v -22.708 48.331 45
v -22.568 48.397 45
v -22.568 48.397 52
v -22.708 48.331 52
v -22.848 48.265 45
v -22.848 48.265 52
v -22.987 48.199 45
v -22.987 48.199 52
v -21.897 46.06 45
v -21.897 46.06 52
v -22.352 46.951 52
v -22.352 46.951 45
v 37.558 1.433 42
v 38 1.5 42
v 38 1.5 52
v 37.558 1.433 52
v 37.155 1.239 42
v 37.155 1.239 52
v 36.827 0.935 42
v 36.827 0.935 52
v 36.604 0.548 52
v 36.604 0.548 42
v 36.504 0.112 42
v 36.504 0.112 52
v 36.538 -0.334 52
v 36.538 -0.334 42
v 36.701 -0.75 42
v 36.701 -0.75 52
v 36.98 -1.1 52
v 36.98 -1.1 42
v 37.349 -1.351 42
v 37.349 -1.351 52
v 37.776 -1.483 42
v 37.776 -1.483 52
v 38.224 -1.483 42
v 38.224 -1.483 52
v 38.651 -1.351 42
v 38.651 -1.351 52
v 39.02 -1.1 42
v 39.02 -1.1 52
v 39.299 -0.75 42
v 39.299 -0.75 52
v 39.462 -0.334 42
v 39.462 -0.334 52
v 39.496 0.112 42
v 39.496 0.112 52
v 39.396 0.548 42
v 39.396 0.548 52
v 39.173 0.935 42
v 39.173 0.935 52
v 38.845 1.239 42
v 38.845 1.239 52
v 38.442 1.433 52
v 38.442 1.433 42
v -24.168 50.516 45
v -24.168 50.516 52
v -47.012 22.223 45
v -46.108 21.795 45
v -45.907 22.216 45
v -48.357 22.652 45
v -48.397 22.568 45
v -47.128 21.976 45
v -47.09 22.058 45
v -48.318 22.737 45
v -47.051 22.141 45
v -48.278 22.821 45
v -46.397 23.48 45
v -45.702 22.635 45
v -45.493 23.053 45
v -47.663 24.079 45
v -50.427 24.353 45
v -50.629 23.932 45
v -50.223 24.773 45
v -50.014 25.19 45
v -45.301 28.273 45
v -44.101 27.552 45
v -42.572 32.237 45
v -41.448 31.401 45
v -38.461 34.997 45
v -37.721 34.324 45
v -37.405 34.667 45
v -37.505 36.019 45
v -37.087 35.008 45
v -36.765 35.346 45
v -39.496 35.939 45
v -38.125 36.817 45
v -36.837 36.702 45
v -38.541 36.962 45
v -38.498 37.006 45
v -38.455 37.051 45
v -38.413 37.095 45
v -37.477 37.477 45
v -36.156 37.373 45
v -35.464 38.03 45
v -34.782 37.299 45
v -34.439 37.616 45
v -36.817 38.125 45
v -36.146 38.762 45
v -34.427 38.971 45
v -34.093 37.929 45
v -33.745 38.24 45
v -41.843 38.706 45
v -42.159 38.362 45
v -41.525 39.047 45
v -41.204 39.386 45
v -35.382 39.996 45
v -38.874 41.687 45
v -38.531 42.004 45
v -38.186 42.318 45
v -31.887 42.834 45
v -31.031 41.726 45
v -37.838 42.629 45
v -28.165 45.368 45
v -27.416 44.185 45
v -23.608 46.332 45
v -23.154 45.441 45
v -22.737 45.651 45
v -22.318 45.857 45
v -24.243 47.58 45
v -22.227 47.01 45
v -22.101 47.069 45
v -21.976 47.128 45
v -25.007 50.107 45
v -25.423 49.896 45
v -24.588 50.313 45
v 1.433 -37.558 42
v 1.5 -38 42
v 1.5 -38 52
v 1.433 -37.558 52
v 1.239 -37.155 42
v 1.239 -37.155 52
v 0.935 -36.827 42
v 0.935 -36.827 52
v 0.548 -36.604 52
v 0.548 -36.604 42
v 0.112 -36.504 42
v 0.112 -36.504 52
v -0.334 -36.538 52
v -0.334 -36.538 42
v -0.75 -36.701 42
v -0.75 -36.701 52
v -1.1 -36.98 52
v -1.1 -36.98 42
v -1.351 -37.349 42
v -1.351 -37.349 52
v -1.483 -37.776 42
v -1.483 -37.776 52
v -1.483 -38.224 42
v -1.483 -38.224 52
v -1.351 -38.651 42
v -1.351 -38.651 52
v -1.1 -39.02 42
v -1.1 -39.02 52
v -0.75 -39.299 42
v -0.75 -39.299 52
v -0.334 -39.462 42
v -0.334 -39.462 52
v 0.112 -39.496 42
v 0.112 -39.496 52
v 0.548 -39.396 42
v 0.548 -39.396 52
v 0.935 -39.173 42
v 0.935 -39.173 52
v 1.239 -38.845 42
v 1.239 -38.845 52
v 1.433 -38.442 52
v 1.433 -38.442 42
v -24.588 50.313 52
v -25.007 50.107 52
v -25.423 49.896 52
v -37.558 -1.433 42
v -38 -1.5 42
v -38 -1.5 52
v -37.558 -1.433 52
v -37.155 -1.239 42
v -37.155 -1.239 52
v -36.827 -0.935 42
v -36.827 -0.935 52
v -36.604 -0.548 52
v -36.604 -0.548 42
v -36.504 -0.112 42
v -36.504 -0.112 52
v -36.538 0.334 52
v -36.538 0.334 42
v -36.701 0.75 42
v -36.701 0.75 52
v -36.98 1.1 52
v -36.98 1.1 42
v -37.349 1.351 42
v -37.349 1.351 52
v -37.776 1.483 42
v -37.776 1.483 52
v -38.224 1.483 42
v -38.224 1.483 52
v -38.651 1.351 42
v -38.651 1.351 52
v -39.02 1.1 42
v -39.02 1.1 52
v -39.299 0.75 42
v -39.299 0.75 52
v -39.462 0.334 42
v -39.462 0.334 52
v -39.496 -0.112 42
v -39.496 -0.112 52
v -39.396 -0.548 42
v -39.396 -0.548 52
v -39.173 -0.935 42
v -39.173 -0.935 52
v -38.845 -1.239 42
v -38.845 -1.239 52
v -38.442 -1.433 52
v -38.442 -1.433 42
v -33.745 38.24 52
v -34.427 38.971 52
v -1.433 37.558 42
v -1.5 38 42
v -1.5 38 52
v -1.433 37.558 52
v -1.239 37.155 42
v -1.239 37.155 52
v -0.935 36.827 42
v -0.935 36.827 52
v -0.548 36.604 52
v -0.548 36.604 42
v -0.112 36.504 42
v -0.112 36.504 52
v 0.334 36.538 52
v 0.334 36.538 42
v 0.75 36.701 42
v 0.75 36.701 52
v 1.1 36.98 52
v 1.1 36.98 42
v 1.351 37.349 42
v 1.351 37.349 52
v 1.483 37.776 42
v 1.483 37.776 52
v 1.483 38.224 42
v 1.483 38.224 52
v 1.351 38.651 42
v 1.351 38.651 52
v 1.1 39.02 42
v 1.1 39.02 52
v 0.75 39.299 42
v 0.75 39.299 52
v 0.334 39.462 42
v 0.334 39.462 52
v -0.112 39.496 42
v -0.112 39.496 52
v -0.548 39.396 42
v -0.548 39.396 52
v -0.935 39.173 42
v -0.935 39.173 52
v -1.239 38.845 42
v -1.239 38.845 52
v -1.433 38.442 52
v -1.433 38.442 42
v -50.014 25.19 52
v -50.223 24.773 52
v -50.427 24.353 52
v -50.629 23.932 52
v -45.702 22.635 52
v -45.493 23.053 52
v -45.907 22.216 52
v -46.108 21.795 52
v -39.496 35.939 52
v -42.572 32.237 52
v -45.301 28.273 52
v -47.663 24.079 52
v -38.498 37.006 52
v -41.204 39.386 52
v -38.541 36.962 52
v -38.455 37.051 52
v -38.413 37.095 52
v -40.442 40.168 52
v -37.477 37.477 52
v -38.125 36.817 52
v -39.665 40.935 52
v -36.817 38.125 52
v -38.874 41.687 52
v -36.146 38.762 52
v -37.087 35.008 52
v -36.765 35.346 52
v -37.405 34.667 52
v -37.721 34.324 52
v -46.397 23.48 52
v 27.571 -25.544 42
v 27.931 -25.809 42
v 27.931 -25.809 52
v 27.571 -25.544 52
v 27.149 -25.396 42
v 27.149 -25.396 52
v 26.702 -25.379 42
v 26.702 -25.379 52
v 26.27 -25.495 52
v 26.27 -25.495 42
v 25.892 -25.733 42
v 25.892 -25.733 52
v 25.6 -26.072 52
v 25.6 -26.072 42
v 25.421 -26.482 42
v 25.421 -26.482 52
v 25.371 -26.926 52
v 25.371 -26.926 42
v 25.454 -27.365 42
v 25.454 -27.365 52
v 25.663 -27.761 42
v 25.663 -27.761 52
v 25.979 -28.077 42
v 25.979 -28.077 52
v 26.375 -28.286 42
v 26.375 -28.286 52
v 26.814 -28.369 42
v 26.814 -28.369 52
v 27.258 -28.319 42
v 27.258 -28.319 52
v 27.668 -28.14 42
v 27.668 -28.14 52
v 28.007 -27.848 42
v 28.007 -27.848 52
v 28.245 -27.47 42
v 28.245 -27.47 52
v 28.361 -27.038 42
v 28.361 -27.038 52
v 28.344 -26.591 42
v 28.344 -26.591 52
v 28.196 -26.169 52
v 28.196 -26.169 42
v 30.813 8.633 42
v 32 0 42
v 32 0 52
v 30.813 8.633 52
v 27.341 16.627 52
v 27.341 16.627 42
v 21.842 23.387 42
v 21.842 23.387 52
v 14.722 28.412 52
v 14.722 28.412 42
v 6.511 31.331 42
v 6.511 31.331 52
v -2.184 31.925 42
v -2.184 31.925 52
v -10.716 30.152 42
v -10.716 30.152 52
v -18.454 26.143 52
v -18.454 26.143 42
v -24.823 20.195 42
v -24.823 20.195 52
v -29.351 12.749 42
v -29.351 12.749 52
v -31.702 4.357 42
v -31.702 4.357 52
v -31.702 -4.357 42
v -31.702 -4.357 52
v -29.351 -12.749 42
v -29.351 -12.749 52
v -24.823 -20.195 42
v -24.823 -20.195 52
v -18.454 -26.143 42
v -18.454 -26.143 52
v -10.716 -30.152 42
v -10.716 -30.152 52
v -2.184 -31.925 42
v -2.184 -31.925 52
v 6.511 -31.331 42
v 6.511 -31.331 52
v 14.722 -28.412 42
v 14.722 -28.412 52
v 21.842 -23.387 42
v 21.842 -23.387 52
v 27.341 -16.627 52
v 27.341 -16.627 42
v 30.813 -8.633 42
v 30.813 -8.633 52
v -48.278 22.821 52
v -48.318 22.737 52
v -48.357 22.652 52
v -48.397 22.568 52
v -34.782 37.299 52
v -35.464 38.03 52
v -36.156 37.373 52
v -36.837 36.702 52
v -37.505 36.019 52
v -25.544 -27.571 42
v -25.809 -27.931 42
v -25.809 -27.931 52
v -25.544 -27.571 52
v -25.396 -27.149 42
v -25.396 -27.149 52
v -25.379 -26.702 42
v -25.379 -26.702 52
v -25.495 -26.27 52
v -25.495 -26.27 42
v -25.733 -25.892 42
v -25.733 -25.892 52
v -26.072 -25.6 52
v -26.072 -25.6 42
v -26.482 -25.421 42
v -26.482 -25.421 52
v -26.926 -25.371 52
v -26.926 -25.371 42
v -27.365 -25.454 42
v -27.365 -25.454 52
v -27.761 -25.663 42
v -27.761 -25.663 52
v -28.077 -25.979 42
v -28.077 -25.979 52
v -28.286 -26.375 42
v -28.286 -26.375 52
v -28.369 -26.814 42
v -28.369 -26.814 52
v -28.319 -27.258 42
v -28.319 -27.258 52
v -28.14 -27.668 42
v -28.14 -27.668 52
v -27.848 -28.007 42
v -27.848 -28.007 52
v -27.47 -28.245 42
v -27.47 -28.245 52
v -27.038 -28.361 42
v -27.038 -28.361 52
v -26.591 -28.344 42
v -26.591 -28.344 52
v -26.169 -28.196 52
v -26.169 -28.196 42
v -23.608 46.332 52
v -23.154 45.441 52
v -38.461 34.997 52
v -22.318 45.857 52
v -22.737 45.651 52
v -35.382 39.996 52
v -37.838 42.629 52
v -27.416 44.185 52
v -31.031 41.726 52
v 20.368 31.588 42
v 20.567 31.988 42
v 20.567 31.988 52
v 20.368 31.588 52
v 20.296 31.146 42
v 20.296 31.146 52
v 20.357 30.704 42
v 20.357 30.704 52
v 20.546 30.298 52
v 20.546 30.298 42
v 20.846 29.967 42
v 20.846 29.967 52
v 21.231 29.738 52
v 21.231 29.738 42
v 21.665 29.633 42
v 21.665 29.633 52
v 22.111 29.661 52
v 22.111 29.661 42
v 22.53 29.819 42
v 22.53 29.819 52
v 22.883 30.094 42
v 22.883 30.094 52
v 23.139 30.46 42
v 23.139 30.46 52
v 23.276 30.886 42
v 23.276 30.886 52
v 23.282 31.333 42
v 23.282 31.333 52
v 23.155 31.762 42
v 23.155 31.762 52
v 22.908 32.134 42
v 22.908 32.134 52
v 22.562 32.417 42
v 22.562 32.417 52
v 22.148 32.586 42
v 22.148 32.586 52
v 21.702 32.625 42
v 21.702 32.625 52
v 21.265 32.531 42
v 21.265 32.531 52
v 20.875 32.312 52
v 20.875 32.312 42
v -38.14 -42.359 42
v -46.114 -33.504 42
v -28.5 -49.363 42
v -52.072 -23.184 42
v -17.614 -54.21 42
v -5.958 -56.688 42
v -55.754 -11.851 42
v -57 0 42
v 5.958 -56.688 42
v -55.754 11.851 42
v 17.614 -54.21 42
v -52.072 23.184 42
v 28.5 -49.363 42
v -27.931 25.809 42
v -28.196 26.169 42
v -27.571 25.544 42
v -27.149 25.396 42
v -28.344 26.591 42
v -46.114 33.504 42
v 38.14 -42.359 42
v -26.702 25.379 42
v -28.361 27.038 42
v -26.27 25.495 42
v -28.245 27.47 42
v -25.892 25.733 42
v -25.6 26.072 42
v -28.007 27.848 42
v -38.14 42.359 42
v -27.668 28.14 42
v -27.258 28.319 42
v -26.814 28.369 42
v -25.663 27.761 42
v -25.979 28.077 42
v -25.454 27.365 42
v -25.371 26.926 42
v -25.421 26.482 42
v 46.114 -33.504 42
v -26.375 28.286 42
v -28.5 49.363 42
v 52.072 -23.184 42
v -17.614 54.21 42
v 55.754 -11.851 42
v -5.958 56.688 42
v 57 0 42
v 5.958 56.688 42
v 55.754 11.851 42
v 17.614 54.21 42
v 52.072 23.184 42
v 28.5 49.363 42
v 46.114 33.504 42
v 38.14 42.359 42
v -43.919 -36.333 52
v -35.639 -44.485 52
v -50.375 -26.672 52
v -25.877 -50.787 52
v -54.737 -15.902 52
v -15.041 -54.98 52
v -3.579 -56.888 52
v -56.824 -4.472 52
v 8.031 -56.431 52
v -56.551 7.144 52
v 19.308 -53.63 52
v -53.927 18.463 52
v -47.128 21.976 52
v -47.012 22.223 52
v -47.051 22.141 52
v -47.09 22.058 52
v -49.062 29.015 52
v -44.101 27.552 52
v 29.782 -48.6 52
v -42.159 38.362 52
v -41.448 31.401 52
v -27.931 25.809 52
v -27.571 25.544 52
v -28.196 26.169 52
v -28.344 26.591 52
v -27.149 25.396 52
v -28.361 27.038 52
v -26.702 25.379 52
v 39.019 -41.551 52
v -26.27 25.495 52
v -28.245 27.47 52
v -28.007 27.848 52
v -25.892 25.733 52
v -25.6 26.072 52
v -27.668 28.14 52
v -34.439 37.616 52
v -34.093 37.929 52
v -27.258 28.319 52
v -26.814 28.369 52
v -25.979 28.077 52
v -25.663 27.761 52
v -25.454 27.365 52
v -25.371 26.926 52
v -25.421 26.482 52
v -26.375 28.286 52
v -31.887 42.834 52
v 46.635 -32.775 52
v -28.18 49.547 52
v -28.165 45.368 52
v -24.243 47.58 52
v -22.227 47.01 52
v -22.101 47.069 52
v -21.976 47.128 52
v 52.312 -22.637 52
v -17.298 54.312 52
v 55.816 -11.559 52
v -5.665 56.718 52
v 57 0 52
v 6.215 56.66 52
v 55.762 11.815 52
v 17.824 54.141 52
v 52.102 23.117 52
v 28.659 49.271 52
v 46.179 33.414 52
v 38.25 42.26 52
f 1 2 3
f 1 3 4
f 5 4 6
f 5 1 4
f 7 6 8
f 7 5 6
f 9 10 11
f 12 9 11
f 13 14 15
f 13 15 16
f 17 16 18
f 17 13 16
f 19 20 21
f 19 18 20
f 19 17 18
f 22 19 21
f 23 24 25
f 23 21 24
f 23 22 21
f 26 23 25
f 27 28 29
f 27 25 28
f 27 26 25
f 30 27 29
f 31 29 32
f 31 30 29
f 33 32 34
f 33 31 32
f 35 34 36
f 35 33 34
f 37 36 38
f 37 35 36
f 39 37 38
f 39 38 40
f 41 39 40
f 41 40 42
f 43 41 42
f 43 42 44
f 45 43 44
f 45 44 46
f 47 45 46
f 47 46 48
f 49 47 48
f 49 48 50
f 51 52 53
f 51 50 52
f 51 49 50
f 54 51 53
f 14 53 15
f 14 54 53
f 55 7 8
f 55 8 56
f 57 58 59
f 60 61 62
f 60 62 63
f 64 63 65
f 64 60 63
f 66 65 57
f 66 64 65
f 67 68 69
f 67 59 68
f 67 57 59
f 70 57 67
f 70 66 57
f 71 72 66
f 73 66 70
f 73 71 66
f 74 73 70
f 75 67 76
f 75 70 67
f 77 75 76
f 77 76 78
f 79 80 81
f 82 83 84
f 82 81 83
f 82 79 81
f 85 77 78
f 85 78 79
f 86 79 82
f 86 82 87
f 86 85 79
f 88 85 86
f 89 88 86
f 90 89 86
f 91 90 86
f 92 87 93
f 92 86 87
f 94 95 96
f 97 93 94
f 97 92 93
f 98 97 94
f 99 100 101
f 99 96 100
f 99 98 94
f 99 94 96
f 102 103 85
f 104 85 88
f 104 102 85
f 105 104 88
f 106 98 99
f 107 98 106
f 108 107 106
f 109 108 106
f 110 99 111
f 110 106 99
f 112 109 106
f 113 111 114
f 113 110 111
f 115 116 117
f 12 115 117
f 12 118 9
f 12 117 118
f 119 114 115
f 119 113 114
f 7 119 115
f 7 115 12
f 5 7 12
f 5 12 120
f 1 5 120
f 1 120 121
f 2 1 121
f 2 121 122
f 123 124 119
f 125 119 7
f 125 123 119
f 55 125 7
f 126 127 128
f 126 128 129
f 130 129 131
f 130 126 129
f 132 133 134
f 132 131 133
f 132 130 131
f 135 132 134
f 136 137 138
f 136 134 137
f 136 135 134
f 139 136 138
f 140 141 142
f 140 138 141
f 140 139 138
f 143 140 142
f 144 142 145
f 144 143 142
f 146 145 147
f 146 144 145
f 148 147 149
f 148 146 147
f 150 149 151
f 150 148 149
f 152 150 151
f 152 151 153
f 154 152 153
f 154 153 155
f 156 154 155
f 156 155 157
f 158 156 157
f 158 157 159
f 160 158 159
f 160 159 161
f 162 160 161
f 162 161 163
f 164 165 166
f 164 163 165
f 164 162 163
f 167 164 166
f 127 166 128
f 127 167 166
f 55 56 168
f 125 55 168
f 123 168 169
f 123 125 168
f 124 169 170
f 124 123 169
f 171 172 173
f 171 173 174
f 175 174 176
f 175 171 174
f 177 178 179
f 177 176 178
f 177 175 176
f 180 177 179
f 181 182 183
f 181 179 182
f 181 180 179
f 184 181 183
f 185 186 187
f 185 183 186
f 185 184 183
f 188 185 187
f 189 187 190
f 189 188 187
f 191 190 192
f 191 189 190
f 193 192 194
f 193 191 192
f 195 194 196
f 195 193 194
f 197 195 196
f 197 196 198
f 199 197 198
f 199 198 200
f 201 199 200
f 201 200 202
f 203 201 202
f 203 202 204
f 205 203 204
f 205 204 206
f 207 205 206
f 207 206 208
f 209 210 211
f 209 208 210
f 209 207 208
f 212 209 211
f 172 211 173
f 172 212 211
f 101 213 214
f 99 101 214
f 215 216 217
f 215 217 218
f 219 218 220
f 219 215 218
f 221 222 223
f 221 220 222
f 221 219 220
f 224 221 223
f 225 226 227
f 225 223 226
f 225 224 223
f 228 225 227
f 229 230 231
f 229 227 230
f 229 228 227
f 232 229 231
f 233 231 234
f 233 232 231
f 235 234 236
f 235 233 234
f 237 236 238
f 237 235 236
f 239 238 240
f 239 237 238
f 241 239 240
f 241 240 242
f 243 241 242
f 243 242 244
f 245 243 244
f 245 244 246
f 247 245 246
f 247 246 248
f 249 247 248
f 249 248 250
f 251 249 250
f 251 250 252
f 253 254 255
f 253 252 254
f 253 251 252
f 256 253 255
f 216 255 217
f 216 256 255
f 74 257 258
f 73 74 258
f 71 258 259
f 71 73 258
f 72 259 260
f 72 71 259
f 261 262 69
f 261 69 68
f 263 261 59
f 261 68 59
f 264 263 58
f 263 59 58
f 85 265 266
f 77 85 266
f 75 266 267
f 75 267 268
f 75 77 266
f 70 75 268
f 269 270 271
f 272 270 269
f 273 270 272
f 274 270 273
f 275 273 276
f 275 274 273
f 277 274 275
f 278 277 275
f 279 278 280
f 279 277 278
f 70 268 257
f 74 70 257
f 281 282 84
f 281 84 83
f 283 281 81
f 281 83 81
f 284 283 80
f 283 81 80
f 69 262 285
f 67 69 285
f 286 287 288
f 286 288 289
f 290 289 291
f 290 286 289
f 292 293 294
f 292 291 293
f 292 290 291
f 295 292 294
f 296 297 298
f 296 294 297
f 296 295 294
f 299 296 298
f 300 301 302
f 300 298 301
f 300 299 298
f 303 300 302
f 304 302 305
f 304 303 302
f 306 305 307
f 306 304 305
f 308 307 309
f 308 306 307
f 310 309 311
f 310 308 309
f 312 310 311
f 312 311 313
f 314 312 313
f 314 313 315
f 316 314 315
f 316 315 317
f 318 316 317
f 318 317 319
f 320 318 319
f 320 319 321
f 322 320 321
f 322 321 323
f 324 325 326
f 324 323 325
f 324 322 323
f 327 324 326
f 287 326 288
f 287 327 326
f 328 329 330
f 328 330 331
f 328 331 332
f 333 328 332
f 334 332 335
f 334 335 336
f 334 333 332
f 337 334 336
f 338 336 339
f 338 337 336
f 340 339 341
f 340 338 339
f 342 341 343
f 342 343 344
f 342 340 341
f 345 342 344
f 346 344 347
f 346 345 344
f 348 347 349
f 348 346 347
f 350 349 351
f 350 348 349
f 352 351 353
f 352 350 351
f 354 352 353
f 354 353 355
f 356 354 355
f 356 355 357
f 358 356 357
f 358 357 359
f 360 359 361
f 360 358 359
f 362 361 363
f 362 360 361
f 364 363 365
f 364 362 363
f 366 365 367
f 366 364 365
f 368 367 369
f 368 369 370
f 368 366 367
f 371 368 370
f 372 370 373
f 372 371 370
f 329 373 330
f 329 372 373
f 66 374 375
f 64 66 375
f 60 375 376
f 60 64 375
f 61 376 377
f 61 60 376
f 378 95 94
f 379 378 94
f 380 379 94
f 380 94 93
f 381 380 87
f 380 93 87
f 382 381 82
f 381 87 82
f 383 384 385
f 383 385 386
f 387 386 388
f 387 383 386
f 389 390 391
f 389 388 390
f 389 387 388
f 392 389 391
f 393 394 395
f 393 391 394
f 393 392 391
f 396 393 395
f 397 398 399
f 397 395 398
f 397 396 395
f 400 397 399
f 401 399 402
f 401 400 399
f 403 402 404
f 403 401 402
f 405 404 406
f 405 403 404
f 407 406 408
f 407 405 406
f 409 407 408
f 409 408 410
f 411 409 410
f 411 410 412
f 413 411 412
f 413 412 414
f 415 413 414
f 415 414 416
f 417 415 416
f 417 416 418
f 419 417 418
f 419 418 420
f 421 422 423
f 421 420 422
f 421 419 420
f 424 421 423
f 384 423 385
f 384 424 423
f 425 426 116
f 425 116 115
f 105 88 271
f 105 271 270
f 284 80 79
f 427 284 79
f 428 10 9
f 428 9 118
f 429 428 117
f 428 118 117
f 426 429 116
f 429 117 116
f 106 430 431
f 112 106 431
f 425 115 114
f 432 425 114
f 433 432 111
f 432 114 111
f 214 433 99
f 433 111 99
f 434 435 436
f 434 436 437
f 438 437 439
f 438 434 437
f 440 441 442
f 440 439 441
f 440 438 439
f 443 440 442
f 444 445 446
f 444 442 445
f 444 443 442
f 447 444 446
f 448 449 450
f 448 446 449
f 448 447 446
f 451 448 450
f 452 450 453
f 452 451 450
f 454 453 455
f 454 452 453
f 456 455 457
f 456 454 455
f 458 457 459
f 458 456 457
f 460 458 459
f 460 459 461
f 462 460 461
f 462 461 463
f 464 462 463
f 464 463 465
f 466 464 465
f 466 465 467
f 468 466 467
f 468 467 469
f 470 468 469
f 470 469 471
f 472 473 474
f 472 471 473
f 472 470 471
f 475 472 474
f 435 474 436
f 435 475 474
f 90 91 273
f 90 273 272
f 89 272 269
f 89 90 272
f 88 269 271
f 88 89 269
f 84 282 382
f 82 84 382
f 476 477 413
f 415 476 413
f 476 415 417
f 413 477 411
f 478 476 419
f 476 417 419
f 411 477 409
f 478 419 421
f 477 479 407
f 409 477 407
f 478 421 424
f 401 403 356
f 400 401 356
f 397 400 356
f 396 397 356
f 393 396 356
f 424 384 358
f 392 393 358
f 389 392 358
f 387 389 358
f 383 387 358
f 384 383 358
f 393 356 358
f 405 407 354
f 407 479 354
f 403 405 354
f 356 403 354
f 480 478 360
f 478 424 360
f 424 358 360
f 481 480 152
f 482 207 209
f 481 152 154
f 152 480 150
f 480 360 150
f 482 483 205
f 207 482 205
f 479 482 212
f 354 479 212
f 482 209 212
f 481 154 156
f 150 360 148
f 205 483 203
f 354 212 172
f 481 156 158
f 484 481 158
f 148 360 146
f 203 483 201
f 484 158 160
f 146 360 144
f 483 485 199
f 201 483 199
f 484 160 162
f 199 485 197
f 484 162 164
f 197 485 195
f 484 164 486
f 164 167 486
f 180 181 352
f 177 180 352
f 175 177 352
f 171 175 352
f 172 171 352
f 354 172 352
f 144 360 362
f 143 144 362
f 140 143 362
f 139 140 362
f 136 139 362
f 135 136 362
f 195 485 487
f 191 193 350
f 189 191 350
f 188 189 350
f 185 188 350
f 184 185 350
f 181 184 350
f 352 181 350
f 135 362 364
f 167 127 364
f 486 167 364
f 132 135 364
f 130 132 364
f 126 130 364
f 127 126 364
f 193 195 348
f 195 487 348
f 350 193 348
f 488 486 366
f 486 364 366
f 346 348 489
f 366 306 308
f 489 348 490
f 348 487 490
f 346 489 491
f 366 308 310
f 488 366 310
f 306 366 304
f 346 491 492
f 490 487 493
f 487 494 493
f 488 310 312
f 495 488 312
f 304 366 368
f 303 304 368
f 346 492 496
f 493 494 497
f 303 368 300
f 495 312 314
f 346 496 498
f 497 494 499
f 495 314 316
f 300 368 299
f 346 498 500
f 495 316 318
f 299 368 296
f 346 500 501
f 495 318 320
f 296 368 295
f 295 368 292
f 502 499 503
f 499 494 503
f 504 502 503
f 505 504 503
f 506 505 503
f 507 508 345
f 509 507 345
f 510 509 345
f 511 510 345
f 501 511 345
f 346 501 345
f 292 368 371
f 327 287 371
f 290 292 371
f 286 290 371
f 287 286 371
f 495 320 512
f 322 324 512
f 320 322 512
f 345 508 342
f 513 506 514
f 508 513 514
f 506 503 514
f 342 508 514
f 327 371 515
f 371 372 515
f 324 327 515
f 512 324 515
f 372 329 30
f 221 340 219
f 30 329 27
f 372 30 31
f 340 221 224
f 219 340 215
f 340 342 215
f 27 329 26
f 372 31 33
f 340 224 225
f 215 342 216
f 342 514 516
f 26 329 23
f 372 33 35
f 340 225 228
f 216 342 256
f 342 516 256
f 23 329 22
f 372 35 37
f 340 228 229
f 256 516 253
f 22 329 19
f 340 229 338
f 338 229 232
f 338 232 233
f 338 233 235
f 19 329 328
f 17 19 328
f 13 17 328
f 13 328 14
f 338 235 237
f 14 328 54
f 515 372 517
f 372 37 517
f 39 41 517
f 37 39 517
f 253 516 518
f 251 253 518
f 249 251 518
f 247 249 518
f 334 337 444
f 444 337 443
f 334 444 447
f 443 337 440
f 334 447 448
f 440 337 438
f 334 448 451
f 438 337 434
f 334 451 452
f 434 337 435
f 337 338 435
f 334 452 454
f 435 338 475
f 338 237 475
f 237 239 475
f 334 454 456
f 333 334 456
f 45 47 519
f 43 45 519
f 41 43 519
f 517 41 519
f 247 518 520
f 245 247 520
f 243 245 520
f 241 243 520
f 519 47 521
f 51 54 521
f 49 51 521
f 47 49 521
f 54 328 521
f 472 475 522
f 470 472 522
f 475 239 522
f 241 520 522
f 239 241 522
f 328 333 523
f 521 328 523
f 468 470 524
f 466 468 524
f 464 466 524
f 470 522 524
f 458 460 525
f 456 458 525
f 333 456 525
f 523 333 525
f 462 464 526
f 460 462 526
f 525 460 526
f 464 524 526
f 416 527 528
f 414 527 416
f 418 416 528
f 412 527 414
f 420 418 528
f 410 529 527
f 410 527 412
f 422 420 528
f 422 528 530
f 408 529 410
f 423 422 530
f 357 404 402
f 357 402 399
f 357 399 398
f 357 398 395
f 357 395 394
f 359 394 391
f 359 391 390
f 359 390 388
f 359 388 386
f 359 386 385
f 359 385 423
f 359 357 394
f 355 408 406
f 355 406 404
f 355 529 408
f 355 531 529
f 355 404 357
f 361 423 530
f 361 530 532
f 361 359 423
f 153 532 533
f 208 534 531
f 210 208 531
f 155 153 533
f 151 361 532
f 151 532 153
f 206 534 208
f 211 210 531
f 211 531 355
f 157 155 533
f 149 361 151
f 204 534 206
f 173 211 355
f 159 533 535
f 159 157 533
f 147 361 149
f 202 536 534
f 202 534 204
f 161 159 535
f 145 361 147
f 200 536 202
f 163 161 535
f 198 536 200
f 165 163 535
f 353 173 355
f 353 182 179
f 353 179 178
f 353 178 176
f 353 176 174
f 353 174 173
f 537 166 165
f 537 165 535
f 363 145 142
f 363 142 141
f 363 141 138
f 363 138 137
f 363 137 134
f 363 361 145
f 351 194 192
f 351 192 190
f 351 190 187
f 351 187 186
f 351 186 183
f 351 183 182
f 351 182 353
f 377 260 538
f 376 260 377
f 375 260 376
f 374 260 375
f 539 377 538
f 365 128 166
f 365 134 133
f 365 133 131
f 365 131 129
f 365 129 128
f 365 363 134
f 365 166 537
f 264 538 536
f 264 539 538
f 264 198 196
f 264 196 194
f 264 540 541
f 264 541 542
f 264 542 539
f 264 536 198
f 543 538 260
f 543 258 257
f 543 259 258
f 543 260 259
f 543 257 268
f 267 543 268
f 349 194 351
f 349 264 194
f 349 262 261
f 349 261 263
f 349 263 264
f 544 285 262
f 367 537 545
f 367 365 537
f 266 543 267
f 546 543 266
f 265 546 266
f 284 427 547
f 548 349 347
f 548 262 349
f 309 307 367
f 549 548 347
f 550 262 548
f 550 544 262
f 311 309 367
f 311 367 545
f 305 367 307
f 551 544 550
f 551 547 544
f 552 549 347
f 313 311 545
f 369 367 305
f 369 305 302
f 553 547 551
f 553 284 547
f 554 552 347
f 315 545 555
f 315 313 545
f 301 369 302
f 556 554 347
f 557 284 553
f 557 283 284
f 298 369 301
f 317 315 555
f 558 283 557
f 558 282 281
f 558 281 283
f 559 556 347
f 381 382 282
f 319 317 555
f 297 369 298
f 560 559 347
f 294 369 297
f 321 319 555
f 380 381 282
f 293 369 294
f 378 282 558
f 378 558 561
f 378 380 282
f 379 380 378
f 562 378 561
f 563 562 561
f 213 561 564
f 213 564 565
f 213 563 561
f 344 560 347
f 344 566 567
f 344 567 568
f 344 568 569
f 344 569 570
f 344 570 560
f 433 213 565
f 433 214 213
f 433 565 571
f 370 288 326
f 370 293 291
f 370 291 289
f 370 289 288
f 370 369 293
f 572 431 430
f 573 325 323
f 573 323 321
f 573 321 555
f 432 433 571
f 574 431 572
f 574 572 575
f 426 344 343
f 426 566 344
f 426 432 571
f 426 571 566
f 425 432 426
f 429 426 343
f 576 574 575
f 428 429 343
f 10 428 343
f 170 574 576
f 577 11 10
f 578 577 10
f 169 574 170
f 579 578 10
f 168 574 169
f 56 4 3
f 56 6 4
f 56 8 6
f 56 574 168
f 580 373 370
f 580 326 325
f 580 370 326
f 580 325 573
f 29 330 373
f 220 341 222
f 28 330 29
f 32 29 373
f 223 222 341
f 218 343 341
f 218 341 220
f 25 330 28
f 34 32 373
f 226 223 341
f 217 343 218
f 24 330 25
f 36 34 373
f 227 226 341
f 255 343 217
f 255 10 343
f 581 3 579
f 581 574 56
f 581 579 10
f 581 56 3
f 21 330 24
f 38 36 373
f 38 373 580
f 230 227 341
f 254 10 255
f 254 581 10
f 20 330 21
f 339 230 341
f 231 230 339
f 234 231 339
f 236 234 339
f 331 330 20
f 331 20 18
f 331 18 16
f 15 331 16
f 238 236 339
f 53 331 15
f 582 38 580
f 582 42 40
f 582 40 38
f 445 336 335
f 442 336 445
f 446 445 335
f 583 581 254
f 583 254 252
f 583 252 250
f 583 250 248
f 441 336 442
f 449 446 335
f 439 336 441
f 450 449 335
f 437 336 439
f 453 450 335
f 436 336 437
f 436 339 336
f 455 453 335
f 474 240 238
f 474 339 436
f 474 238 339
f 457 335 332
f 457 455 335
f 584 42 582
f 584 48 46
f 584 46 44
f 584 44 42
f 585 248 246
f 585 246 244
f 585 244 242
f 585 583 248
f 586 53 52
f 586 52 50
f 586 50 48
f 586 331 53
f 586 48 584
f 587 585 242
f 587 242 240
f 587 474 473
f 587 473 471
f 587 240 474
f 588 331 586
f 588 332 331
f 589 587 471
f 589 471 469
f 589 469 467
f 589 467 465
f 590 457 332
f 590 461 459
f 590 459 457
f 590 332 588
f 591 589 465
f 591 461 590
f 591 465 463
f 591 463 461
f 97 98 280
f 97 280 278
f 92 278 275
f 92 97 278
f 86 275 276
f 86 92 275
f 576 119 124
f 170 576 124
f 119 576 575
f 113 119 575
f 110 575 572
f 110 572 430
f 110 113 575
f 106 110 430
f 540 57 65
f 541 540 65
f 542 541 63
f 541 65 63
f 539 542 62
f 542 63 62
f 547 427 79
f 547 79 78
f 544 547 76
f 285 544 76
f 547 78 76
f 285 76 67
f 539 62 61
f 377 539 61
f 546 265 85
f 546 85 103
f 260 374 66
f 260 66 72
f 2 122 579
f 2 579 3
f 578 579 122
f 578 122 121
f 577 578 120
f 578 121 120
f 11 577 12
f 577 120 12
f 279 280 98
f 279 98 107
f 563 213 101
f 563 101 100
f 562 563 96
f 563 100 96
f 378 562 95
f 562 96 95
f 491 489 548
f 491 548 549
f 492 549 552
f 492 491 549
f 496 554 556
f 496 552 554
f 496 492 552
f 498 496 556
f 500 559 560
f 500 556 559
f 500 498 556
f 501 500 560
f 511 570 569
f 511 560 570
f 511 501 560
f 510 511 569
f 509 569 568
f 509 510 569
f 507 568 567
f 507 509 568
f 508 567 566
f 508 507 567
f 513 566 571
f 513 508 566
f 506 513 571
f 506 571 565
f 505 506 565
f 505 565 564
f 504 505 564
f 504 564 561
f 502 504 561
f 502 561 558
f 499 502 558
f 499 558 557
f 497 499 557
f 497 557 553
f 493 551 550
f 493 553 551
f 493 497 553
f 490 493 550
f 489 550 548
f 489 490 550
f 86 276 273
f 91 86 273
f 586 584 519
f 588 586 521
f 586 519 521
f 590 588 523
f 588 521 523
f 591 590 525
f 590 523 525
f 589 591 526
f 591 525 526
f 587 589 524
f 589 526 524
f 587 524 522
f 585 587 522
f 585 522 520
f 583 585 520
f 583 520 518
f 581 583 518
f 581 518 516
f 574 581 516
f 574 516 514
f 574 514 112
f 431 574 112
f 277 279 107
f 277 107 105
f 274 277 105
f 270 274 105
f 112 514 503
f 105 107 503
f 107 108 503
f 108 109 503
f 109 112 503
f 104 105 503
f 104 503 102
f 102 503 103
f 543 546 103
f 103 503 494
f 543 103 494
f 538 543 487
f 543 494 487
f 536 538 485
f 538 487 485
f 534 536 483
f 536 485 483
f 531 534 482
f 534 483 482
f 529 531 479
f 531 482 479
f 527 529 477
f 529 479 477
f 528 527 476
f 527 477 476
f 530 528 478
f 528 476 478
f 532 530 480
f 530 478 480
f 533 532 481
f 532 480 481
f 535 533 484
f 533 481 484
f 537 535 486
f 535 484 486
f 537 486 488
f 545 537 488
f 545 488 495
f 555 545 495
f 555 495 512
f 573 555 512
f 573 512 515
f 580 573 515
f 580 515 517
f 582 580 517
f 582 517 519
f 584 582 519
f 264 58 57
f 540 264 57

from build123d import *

# Parameters (mm, degrees)
CYLINDER2172_R               = 56
CYLINDER2172_DEPTH           = 7
CYLINDER2171_R               = 51
CYLINDER2171_DEPTH           = 7
BOX1045_W                    = 1.4
BOX1045_H                    = 60
BOX1045_DEPTH                = 7
BOX1045_PLACEMENT_ANGLE      = 19.7
BOX1044_W                    = 1.4
BOX1044_H                    = 60
BOX1044_DEPTH                = 7
BOX1044_PLACEMENT_ANGLE      = 18
CUT727_PLACEMENT_ANGLE       = 45
BOX1038_W                    = 60
BOX1038_H                    = 60
BOX1038_DEPTH                = 7
BOX1038_PLACEMENT_ANGLE      = 1
BOX1036_W                    = 60
BOX1036_H                    = 60
BOX1036_DEPTH                = 7
BOX1036_PLACEMENT_ANGLE      = 2
BOX1043_W                    = 120
BOX1043_H                    = 60
BOX1043_DEPTH                = 7
TUBE090_R                    = 54.4
TUBE090_R_2                  = 53
TUBE090_DEPTH                = 7
BOX1041_W                    = 60
BOX1041_H                    = 60
BOX1041_DEPTH                = 7
BOX1041_PLACEMENT_ANGLE      = 20
BOX1039_W                    = 60
BOX1039_H                    = 60
BOX1039_DEPTH                = 7
BOX1039_PLACEMENT_ANGLE      = 20
BOX1037_W                    = 120
BOX1037_H                    = 60
BOX1037_DEPTH                = 7
TUBE091_R                    = 53.4
TUBE091_R_2                  = 52
TUBE091_DEPTH                = 7
CUT721_PLACEMENT_ANGLE       = 45
CYLINDER2170_R               = 51
CYLINDER2170_DEPTH           = 7
BOX1042_W                    = 1.4
BOX1042_H                    = 60
BOX1042_DEPTH                = 7
BOX1042_PLACEMENT_ANGLE      = 2.7
BOX1040_W                    = 1.4
BOX1040_H                    = 60
BOX1040_DEPTH                = 7
BOX1040_PLACEMENT_ANGLE      = 2
CUT722_PLACEMENT_ANGLE       = 45
CYLINDER2129_R               = 1.5
CYLINDER2129_DEPTH           = 100
CYLINDER2130_R               = 1.5
CYLINDER2130_DEPTH           = 100
CYLINDER2130_PLACEMENT_ANGLE = 145
CYLINDER2131_R               = 1.5
CYLINDER2131_DEPTH           = 100
CYLINDER2132_R               = 1.5
CYLINDER2132_DEPTH           = 100
CYLINDER2132_PLACEMENT_ANGLE = 225
CYLINDER2133_R               = 1.5
CYLINDER2133_DEPTH           = 100
CYLINDER2134_R               = 1.5
CYLINDER2134_DEPTH           = 100
CYLINDER2134_PLACEMENT_ANGLE = 45
CYLINDER2127_R               = 1.5
CYLINDER2127_DEPTH           = 100
CYLINDER2128_R               = 1.5
CYLINDER2128_DEPTH           = 100
CYLINDER2128_PLACEMENT_ANGLE = 45
TUBE092_R                    = 57
TUBE092_R_2                  = 32
TUBE092_DEPTH                = 10


with BuildPart() as v_lec2172:
    # Cylinder2172 → Cylinder2172 (new body)
    with BuildSketch(Plane.XY.offset(45)):
        Circle(CYLINDER2172_R)
    extrude(amount=CYLINDER2172_DEPTH)


with BuildPart() as v_lec2171:
    # Cylinder2171 → Cylinder2171 (new body)
    with BuildSketch(Plane.XY.offset(-22)):
        Circle(CYLINDER2171_R)
    extrude(amount=CYLINDER2171_DEPTH)


with BuildPart() as krychle1045:
    # Box1045 → Box1045 (new body)
    with BuildSketch(Plane.XY):
        with Locations((0.7, 30)):
            Rectangle(BOX1045_W, BOX1045_H)
    extrude(amount=BOX1045_DEPTH)


with BuildPart() as krychle1045_1:
    # Box1045 placement: moved
    add(krychle1045.part.moved(Location((0, 0, -22))).rotate(Axis((0, 0, -22), (0, 0, 1)), BOX1045_PLACEMENT_ANGLE))


with BuildPart() as common:
    # Box1044 → Box1044 (new body)
    with BuildSketch(Plane.XY):
        with Locations((0.7, 30)):
            Rectangle(BOX1044_W, BOX1044_H)
    extrude(amount=BOX1044_DEPTH)


with BuildPart() as common_1:
    # Box1044 placement: moved
    add(common.part.moved(Location((0, 0, -22))).rotate(Axis((0, 0, -22), (0, 0, -1)), BOX1044_PLACEMENT_ANGLE))

    # Compound1133: union Krychle1045
    add(krychle1045_1.part)

    # Cut727: cut Válec2171
    add(v_lec2171.part, mode=Mode.SUBTRACT)


with BuildPart() as common_2:
    # Cut727 placement: moved
    add(common_1.part.moved(Location((0, 0, 67))).rotate(Axis((0, 0, 67), (0, 0, 1)), CUT727_PLACEMENT_ANGLE))

    # Common: intersect Válec2172
    add(v_lec2172.part, mode=Mode.INTERSECT)


with BuildPart() as krychle1038:
    # Box1038 → Box1038 (new body)
    with BuildSketch(Plane.XY):
        with Locations((30, 30)):
            Rectangle(BOX1038_W, BOX1038_H)
    extrude(amount=BOX1038_DEPTH)


with BuildPart() as krychle1038_1:
    # Box1038 placement: moved
    add(krychle1038.part.moved(Location((-59.990862, -1.047144, -22))).rotate(Axis((-59.990862, -1.047144, -22), (0, 0, 1)), BOX1038_PLACEMENT_ANGLE))


with BuildPart() as compound1130:
    # Box1036 → Box1036 (new body)
    with BuildSketch(Plane.XY):
        with Locations((30, 30)):
            Rectangle(BOX1036_W, BOX1036_H)
    extrude(amount=BOX1036_DEPTH)


with BuildPart() as compound1130_1:
    # Box1036 placement: moved
    add(compound1130.part.moved(Location((0, 0, -22))).rotate(Axis((0, 0, -22), (0, 0, -1)), BOX1036_PLACEMENT_ANGLE))

    # Compound1130: union Krychle1038
    add(krychle1038_1.part)


with BuildPart() as krychle1043:
    # Box1043 → Box1043 (new body)
    with BuildSketch(Plane(origin=(-60, -60, -22), x_dir=(1, 0, 0), z_dir=(0, 0, 1))):
        with Locations((60, 30)):
            Rectangle(BOX1043_W, BOX1043_H)
    extrude(amount=BOX1043_DEPTH)


with BuildPart() as cut723:
    # Tube090 → Tube090 (new body)
    with BuildSketch(Plane.XY.offset(-22)):
        Circle(TUBE090_R)
        Circle(TUBE090_R_2, mode=Mode.SUBTRACT)
    extrude(amount=TUBE090_DEPTH)

    # Cut726: cut Krychle1043
    add(krychle1043.part, mode=Mode.SUBTRACT)

    # Cut723: cut Compound1130
    add(compound1130_1.part, mode=Mode.SUBTRACT)


with BuildPart() as cut723_1:
    # Cut723 placement: moved
    add(cut723.part.moved(Location((0, 0, -7))))


with BuildPart() as krychle1041:
    # Box1041 → Box1041 (new body)
    with BuildSketch(Plane.XY):
        with Locations((30, 30)):
            Rectangle(BOX1041_W, BOX1041_H)
    extrude(amount=BOX1041_DEPTH)


with BuildPart() as krychle1041_1:
    # Box1041 placement: moved
    add(krychle1041.part.moved(Location((-56.381557, -20.521209, -22))).rotate(Axis((-56.381557, -20.521209, -22), (0, 0, 1)), BOX1041_PLACEMENT_ANGLE))


with BuildPart() as compound1129:
    # Box1039 → Box1039 (new body)
    with BuildSketch(Plane.XY):
        with Locations((30, 30)):
            Rectangle(BOX1039_W, BOX1039_H)
    extrude(amount=BOX1039_DEPTH)


with BuildPart() as compound1129_1:
    # Box1039 placement: moved
    add(compound1129.part.moved(Location((0, 0, -22))).rotate(Axis((0, 0, -22), (0, 0, -1)), BOX1039_PLACEMENT_ANGLE))

    # Compound1129: union Krychle1041
    add(krychle1041_1.part)


with BuildPart() as krychle1037:
    # Box1037 → Box1037 (new body)
    with BuildSketch(Plane(origin=(-60, -60, -22), x_dir=(1, 0, 0), z_dir=(0, 0, 1))):
        with Locations((60, 30)):
            Rectangle(BOX1037_W, BOX1037_H)
    extrude(amount=BOX1037_DEPTH)


with BuildPart() as cut721:
    # Tube091 → Tube091 (new body)
    with BuildSketch(Plane.XY.offset(-22)):
        Circle(TUBE091_R)
        Circle(TUBE091_R_2, mode=Mode.SUBTRACT)
    extrude(amount=TUBE091_DEPTH)

    # Cut718: cut Krychle1037
    add(krychle1037.part, mode=Mode.SUBTRACT)

    # Cut724: cut Compound1129
    add(compound1129_1.part, mode=Mode.SUBTRACT)


with BuildPart() as cut721_1:
    # Cut724 placement: moved
    add(cut721.part.moved(Location((0, 0, -7))))

    # Cut721: cut Cut723
    add(cut723_1.part, mode=Mode.SUBTRACT)


with BuildPart() as cut721_2:
    # Cut721 placement: moved
    add(cut721_1.part.moved(Location((0, 0, 74))).rotate(Axis((0, 0, 74), (0, 0, 1)), CUT721_PLACEMENT_ANGLE))


with BuildPart() as v_lec2170:
    # Cylinder2170 → Cylinder2170 (new body)
    with BuildSketch(Plane.XY.offset(-22)):
        Circle(CYLINDER2170_R)
    extrude(amount=CYLINDER2170_DEPTH)


with BuildPart() as krychle1042:
    # Box1042 → Box1042 (new body)
    with BuildSketch(Plane.XY):
        with Locations((0.7, 30)):
            Rectangle(BOX1042_W, BOX1042_H)
    extrude(amount=BOX1042_DEPTH)


with BuildPart() as krychle1042_1:
    # Box1042 placement: moved
    add(krychle1042.part.moved(Location((0, 0, -22))).rotate(Axis((0, 0, -22), (0, 0, 1)), BOX1042_PLACEMENT_ANGLE))


with BuildPart() as cut722:
    # Box1040 → Box1040 (new body)
    with BuildSketch(Plane.XY):
        with Locations((0.7, 30)):
            Rectangle(BOX1040_W, BOX1040_H)
    extrude(amount=BOX1040_DEPTH)


with BuildPart() as cut722_1:
    # Box1040 placement: moved
    add(cut722.part.moved(Location((0, 0, -22))).rotate(Axis((0, 0, -22), (0, 0, -1)), BOX1040_PLACEMENT_ANGLE))

    # Compound1131: union Krychle1042
    add(krychle1042_1.part)

    # Cut722: cut Válec2170
    add(v_lec2170.part, mode=Mode.SUBTRACT)


with BuildPart() as cut722_2:
    # Cut722 placement: moved
    add(cut722_1.part.moved(Location((0, 0, 67))).rotate(Axis((0, 0, 67), (0, 0, 1)), CUT722_PLACEMENT_ANGLE))


with BuildPart() as v_lec2129:
    # Cylinder2129 → Cylinder2129 (new body)
    with BuildSketch(Plane(origin=(38, 0, 0), x_dir=(0, 1, 0), z_dir=(0, 0, 1))):
        Circle(CYLINDER2129_R)
    extrude(amount=CYLINDER2129_DEPTH)


with BuildPart() as v_lec2130:
    # Cylinder2130 → Cylinder2130 (new body)
    with BuildSketch(Plane.XY):
        Circle(CYLINDER2130_R)
    extrude(amount=CYLINDER2130_DEPTH)


with BuildPart() as v_lec2130_1:
    # Cylinder2130 placement: moved
    add(v_lec2130.part.moved(Location((21.795905, 31.127778, 0))).rotate(Axis((21.795905, 31.127778, 0), (0, 0, 1)), CYLINDER2130_PLACEMENT_ANGLE))


with BuildPart() as v_lec2131:
    # Cylinder2131 → Cylinder2131 (new body)
    with BuildSketch(Plane(origin=(0, 38, 0), x_dir=(-1, 0, 0), z_dir=(0, 0, 1))):
        Circle(CYLINDER2131_R)
    extrude(amount=CYLINDER2131_DEPTH)


with BuildPart() as v_lec2132:
    # Cylinder2132 → Cylinder2132 (new body)
    with BuildSketch(Plane.XY):
        Circle(CYLINDER2132_R)
    extrude(amount=CYLINDER2132_DEPTH)


with BuildPart() as v_lec2132_1:
    # Cylinder2132 placement: moved
    add(v_lec2132.part.moved(Location((-26.870058, 26.870058, 0))).rotate(Axis((-26.870058, 26.870058, 0), (0, 0, 1)), CYLINDER2132_PLACEMENT_ANGLE))


with BuildPart() as v_lec2133:
    # Cylinder2133 → Cylinder2133 (new body)
    with BuildSketch(Plane(origin=(-38, 0, 0), x_dir=(0, -1, 0), z_dir=(0, 0, 1))):
        Circle(CYLINDER2133_R)
    extrude(amount=CYLINDER2133_DEPTH)


with BuildPart() as v_lec2134:
    # Cylinder2134 → Cylinder2134 (new body)
    with BuildSketch(Plane.XY):
        Circle(CYLINDER2134_R)
    extrude(amount=CYLINDER2134_DEPTH)


with BuildPart() as v_lec2134_1:
    # Cylinder2134 placement: moved
    add(v_lec2134.part.moved(Location((-26.870058, -26.870058, 0))).rotate(Axis((-26.870058, -26.870058, 0), (0, 0, -1)), CYLINDER2134_PLACEMENT_ANGLE))


with BuildPart() as v_lec2127:
    # Cylinder2127 → Cylinder2127 (new body)
    with BuildSketch(Plane(origin=(0, -38, 0), x_dir=(1, 0, 0), z_dir=(0, 0, 1))):
        Circle(CYLINDER2127_R)
    extrude(amount=CYLINDER2127_DEPTH)


with BuildPart() as compound1132:
    # Cylinder2128 → Cylinder2128 (new body)
    with BuildSketch(Plane.XY):
        Circle(CYLINDER2128_R)
    extrude(amount=CYLINDER2128_DEPTH)


with BuildPart() as compound1132_1:
    # Cylinder2128 placement: moved
    add(compound1132.part.moved(Location((26.870058, -26.870058, 0))).rotate(Axis((26.870058, -26.870058, 0), (0, 0, 1)), CYLINDER2128_PLACEMENT_ANGLE))

    # Compound1132: union Válec2129, Válec2130, Válec2131, Válec2132, Válec2133, Válec2134, Válec2127
    add(v_lec2129.part)
    add(v_lec2130_1.part)
    add(v_lec2131.part)
    add(v_lec2132_1.part)
    add(v_lec2133.part)
    add(v_lec2134_1.part)
    add(v_lec2127.part)


with BuildPart() as cut728:
    # Tube092 → Tube092 (new body)
    with BuildSketch(Plane.XY.offset(42)):
        Circle(TUBE092_R)
        Circle(TUBE092_R_2, mode=Mode.SUBTRACT)
    extrude(amount=TUBE092_DEPTH)

    # Cut725: cut Compound1132
    add(compound1132_1.part, mode=Mode.SUBTRACT)

    # Cut719: cut Cut722
    add(cut722_2.part, mode=Mode.SUBTRACT)

    # Cut720: cut Cut721
    add(cut721_2.part, mode=Mode.SUBTRACT)

    # Cut728: cut Common
    add(common_2.part, mode=Mode.SUBTRACT)


solid = cut728.part
